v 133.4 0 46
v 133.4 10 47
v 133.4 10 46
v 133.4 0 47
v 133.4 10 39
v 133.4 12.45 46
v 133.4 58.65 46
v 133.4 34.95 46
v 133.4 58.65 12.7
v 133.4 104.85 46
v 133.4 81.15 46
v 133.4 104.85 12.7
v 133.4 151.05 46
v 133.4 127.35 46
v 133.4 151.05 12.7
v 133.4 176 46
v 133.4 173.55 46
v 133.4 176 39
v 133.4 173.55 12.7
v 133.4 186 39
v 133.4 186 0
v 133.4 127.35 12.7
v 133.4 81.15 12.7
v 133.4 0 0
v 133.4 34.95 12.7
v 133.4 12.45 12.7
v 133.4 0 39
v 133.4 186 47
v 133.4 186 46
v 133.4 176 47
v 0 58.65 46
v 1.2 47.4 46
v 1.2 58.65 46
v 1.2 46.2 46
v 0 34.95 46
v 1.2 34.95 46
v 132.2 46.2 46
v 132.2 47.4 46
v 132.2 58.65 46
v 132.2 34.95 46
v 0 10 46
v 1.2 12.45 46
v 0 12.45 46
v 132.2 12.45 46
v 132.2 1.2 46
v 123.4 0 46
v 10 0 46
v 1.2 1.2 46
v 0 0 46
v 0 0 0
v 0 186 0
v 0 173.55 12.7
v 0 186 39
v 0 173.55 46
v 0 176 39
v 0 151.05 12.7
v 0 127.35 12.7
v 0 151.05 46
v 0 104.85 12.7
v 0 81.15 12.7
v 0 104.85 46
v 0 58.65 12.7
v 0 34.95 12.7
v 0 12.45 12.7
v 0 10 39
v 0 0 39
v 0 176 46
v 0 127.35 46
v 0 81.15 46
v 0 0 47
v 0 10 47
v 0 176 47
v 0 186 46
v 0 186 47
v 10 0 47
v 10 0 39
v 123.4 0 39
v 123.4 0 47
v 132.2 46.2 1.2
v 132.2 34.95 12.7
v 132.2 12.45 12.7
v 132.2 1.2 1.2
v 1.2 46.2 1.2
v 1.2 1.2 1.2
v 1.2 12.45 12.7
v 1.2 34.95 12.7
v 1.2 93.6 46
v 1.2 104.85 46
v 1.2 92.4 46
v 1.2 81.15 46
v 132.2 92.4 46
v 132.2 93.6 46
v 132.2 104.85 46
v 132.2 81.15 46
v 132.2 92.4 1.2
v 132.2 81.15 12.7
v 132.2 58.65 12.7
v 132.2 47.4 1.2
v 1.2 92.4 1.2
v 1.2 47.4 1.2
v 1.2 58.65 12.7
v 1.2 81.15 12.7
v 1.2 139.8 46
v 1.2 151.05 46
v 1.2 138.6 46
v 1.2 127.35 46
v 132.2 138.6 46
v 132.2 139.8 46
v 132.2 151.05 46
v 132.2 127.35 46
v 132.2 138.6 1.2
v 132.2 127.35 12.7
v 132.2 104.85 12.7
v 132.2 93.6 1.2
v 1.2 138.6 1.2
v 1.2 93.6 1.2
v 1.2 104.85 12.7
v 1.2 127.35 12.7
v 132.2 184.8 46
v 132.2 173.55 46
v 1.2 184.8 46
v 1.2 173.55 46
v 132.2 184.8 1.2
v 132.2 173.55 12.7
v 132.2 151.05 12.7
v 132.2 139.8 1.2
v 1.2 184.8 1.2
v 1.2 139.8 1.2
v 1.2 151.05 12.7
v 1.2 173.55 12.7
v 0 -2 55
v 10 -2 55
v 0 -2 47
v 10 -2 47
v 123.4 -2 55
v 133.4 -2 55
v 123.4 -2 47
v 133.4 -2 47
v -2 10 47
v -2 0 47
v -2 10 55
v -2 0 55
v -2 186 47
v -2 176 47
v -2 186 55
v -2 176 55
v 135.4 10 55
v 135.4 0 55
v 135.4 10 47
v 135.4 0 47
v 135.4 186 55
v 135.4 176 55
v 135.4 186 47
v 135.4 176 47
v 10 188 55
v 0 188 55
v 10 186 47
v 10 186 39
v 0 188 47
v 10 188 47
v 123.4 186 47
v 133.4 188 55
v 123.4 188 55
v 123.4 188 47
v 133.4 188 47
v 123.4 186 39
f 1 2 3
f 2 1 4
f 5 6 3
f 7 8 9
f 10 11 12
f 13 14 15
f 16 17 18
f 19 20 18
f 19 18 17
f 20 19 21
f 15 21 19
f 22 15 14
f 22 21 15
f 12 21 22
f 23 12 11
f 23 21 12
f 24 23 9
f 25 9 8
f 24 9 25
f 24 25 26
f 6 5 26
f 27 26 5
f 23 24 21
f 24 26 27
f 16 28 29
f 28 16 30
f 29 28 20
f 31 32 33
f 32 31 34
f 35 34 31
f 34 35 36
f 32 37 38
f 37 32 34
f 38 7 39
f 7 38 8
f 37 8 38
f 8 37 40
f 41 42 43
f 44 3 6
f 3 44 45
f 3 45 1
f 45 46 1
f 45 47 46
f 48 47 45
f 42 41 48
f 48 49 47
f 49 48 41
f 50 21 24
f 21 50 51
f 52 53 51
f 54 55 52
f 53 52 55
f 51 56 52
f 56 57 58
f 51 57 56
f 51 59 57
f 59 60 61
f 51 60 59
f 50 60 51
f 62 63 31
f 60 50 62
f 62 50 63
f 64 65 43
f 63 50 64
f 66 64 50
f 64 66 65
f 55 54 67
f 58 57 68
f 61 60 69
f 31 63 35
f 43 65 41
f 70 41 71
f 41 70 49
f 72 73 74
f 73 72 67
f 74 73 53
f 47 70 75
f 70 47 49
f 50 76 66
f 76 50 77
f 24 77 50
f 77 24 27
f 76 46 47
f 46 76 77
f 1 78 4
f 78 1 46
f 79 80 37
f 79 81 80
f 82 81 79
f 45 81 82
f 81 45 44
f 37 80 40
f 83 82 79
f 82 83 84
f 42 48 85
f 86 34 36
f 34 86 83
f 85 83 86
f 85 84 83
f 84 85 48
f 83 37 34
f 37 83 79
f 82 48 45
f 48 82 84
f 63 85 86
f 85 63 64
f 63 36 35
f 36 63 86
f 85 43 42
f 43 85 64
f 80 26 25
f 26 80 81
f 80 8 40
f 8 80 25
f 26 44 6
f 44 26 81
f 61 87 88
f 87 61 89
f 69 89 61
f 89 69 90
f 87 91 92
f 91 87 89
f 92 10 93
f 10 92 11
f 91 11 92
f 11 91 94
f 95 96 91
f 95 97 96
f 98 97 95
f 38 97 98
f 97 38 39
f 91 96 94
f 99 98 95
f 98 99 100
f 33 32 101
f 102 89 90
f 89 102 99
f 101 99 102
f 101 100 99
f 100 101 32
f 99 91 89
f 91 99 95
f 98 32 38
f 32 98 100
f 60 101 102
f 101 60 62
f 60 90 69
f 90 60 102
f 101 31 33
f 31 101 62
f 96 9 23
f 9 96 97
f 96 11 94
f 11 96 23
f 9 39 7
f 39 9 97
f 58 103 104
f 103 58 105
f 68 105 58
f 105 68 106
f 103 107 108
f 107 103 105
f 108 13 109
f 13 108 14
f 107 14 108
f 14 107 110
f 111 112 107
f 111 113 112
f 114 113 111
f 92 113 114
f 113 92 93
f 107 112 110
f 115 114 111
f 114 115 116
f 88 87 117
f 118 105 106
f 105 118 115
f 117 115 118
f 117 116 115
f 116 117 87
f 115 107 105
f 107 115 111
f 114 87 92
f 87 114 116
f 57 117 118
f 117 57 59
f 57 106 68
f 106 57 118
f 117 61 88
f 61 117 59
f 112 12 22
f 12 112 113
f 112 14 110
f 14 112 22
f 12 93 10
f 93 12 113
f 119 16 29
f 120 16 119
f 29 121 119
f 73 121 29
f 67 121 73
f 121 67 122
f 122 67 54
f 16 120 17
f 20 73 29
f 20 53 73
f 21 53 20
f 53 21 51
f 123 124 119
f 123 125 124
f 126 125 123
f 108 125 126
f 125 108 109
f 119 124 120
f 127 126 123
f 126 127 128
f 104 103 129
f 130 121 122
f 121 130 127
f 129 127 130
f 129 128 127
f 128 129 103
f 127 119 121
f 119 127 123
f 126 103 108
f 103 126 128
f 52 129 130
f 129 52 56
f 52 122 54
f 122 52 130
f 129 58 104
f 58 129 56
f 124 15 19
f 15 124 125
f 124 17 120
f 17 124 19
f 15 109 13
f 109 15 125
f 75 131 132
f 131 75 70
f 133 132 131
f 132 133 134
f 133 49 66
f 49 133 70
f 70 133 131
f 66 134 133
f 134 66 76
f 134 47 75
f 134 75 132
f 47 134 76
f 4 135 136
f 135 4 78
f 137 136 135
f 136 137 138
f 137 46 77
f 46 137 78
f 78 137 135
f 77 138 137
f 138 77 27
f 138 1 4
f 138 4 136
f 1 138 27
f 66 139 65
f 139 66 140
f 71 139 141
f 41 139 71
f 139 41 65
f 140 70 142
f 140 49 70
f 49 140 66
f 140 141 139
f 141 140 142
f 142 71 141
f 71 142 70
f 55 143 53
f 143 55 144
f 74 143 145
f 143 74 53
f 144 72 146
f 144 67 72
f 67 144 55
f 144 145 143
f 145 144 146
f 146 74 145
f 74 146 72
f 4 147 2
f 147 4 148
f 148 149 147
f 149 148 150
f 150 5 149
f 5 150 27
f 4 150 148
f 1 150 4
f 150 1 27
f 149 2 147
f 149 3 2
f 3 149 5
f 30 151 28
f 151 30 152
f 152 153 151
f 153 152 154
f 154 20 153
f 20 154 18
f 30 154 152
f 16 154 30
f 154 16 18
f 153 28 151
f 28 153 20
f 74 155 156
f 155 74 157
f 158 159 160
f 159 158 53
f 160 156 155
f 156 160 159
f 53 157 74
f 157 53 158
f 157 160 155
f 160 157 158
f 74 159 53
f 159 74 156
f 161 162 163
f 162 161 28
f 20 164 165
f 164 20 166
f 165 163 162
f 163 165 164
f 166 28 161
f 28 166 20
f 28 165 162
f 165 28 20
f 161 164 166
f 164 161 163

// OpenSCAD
//131x45x45
wall=1.2;
length=131;
width=45;
height=width+1.0;
//*
for (x = [0:3]) {
    translate([0,(width+wall)*x,0]) difference() {
        cube([length+wall*2, width+wall*2, height]);
        translate([wall,wall,wall])cube([length, width, height]);
        translate([0, wall+.25*width, wall+.25*height]) cube([wall, width*.5, height]);
        translate([wall+length, wall+.25*width, wall+.25*height]) cube([wall, width*.5, height]);
    }
}
//*/
//*
translate([0,0,0]) bracket();
translate([length+wall*2-10,0,0]) bracket();

translate([0,10,0]) rotate([0,0,-90]) bracket();
translate([0,width*4+wall*5,0]) rotate([0,0,-90]) bracket();

translate([length+wall*2,0,0]) rotate([0,0,90]) bracket();
translate([length+wall*2,width*4+wall*5-10,0]) rotate([0,0,90]) bracket();

translate([10,width*4+wall*5,0]) rotate([0,0,180])bracket();
translate([10+length+wall*2-10,width*4+wall*5,0]) rotate([0,0,180]) bracket();
//*/

module bracket() {
    translate([10,-2,height-7]) rotate([0,-90,0]) linear_extrude(10) polygon(
            points=[
            [0,2],
            [8,2],
            [16,0],
            [8,0]
//            [0,2]
            ]
            );
}
